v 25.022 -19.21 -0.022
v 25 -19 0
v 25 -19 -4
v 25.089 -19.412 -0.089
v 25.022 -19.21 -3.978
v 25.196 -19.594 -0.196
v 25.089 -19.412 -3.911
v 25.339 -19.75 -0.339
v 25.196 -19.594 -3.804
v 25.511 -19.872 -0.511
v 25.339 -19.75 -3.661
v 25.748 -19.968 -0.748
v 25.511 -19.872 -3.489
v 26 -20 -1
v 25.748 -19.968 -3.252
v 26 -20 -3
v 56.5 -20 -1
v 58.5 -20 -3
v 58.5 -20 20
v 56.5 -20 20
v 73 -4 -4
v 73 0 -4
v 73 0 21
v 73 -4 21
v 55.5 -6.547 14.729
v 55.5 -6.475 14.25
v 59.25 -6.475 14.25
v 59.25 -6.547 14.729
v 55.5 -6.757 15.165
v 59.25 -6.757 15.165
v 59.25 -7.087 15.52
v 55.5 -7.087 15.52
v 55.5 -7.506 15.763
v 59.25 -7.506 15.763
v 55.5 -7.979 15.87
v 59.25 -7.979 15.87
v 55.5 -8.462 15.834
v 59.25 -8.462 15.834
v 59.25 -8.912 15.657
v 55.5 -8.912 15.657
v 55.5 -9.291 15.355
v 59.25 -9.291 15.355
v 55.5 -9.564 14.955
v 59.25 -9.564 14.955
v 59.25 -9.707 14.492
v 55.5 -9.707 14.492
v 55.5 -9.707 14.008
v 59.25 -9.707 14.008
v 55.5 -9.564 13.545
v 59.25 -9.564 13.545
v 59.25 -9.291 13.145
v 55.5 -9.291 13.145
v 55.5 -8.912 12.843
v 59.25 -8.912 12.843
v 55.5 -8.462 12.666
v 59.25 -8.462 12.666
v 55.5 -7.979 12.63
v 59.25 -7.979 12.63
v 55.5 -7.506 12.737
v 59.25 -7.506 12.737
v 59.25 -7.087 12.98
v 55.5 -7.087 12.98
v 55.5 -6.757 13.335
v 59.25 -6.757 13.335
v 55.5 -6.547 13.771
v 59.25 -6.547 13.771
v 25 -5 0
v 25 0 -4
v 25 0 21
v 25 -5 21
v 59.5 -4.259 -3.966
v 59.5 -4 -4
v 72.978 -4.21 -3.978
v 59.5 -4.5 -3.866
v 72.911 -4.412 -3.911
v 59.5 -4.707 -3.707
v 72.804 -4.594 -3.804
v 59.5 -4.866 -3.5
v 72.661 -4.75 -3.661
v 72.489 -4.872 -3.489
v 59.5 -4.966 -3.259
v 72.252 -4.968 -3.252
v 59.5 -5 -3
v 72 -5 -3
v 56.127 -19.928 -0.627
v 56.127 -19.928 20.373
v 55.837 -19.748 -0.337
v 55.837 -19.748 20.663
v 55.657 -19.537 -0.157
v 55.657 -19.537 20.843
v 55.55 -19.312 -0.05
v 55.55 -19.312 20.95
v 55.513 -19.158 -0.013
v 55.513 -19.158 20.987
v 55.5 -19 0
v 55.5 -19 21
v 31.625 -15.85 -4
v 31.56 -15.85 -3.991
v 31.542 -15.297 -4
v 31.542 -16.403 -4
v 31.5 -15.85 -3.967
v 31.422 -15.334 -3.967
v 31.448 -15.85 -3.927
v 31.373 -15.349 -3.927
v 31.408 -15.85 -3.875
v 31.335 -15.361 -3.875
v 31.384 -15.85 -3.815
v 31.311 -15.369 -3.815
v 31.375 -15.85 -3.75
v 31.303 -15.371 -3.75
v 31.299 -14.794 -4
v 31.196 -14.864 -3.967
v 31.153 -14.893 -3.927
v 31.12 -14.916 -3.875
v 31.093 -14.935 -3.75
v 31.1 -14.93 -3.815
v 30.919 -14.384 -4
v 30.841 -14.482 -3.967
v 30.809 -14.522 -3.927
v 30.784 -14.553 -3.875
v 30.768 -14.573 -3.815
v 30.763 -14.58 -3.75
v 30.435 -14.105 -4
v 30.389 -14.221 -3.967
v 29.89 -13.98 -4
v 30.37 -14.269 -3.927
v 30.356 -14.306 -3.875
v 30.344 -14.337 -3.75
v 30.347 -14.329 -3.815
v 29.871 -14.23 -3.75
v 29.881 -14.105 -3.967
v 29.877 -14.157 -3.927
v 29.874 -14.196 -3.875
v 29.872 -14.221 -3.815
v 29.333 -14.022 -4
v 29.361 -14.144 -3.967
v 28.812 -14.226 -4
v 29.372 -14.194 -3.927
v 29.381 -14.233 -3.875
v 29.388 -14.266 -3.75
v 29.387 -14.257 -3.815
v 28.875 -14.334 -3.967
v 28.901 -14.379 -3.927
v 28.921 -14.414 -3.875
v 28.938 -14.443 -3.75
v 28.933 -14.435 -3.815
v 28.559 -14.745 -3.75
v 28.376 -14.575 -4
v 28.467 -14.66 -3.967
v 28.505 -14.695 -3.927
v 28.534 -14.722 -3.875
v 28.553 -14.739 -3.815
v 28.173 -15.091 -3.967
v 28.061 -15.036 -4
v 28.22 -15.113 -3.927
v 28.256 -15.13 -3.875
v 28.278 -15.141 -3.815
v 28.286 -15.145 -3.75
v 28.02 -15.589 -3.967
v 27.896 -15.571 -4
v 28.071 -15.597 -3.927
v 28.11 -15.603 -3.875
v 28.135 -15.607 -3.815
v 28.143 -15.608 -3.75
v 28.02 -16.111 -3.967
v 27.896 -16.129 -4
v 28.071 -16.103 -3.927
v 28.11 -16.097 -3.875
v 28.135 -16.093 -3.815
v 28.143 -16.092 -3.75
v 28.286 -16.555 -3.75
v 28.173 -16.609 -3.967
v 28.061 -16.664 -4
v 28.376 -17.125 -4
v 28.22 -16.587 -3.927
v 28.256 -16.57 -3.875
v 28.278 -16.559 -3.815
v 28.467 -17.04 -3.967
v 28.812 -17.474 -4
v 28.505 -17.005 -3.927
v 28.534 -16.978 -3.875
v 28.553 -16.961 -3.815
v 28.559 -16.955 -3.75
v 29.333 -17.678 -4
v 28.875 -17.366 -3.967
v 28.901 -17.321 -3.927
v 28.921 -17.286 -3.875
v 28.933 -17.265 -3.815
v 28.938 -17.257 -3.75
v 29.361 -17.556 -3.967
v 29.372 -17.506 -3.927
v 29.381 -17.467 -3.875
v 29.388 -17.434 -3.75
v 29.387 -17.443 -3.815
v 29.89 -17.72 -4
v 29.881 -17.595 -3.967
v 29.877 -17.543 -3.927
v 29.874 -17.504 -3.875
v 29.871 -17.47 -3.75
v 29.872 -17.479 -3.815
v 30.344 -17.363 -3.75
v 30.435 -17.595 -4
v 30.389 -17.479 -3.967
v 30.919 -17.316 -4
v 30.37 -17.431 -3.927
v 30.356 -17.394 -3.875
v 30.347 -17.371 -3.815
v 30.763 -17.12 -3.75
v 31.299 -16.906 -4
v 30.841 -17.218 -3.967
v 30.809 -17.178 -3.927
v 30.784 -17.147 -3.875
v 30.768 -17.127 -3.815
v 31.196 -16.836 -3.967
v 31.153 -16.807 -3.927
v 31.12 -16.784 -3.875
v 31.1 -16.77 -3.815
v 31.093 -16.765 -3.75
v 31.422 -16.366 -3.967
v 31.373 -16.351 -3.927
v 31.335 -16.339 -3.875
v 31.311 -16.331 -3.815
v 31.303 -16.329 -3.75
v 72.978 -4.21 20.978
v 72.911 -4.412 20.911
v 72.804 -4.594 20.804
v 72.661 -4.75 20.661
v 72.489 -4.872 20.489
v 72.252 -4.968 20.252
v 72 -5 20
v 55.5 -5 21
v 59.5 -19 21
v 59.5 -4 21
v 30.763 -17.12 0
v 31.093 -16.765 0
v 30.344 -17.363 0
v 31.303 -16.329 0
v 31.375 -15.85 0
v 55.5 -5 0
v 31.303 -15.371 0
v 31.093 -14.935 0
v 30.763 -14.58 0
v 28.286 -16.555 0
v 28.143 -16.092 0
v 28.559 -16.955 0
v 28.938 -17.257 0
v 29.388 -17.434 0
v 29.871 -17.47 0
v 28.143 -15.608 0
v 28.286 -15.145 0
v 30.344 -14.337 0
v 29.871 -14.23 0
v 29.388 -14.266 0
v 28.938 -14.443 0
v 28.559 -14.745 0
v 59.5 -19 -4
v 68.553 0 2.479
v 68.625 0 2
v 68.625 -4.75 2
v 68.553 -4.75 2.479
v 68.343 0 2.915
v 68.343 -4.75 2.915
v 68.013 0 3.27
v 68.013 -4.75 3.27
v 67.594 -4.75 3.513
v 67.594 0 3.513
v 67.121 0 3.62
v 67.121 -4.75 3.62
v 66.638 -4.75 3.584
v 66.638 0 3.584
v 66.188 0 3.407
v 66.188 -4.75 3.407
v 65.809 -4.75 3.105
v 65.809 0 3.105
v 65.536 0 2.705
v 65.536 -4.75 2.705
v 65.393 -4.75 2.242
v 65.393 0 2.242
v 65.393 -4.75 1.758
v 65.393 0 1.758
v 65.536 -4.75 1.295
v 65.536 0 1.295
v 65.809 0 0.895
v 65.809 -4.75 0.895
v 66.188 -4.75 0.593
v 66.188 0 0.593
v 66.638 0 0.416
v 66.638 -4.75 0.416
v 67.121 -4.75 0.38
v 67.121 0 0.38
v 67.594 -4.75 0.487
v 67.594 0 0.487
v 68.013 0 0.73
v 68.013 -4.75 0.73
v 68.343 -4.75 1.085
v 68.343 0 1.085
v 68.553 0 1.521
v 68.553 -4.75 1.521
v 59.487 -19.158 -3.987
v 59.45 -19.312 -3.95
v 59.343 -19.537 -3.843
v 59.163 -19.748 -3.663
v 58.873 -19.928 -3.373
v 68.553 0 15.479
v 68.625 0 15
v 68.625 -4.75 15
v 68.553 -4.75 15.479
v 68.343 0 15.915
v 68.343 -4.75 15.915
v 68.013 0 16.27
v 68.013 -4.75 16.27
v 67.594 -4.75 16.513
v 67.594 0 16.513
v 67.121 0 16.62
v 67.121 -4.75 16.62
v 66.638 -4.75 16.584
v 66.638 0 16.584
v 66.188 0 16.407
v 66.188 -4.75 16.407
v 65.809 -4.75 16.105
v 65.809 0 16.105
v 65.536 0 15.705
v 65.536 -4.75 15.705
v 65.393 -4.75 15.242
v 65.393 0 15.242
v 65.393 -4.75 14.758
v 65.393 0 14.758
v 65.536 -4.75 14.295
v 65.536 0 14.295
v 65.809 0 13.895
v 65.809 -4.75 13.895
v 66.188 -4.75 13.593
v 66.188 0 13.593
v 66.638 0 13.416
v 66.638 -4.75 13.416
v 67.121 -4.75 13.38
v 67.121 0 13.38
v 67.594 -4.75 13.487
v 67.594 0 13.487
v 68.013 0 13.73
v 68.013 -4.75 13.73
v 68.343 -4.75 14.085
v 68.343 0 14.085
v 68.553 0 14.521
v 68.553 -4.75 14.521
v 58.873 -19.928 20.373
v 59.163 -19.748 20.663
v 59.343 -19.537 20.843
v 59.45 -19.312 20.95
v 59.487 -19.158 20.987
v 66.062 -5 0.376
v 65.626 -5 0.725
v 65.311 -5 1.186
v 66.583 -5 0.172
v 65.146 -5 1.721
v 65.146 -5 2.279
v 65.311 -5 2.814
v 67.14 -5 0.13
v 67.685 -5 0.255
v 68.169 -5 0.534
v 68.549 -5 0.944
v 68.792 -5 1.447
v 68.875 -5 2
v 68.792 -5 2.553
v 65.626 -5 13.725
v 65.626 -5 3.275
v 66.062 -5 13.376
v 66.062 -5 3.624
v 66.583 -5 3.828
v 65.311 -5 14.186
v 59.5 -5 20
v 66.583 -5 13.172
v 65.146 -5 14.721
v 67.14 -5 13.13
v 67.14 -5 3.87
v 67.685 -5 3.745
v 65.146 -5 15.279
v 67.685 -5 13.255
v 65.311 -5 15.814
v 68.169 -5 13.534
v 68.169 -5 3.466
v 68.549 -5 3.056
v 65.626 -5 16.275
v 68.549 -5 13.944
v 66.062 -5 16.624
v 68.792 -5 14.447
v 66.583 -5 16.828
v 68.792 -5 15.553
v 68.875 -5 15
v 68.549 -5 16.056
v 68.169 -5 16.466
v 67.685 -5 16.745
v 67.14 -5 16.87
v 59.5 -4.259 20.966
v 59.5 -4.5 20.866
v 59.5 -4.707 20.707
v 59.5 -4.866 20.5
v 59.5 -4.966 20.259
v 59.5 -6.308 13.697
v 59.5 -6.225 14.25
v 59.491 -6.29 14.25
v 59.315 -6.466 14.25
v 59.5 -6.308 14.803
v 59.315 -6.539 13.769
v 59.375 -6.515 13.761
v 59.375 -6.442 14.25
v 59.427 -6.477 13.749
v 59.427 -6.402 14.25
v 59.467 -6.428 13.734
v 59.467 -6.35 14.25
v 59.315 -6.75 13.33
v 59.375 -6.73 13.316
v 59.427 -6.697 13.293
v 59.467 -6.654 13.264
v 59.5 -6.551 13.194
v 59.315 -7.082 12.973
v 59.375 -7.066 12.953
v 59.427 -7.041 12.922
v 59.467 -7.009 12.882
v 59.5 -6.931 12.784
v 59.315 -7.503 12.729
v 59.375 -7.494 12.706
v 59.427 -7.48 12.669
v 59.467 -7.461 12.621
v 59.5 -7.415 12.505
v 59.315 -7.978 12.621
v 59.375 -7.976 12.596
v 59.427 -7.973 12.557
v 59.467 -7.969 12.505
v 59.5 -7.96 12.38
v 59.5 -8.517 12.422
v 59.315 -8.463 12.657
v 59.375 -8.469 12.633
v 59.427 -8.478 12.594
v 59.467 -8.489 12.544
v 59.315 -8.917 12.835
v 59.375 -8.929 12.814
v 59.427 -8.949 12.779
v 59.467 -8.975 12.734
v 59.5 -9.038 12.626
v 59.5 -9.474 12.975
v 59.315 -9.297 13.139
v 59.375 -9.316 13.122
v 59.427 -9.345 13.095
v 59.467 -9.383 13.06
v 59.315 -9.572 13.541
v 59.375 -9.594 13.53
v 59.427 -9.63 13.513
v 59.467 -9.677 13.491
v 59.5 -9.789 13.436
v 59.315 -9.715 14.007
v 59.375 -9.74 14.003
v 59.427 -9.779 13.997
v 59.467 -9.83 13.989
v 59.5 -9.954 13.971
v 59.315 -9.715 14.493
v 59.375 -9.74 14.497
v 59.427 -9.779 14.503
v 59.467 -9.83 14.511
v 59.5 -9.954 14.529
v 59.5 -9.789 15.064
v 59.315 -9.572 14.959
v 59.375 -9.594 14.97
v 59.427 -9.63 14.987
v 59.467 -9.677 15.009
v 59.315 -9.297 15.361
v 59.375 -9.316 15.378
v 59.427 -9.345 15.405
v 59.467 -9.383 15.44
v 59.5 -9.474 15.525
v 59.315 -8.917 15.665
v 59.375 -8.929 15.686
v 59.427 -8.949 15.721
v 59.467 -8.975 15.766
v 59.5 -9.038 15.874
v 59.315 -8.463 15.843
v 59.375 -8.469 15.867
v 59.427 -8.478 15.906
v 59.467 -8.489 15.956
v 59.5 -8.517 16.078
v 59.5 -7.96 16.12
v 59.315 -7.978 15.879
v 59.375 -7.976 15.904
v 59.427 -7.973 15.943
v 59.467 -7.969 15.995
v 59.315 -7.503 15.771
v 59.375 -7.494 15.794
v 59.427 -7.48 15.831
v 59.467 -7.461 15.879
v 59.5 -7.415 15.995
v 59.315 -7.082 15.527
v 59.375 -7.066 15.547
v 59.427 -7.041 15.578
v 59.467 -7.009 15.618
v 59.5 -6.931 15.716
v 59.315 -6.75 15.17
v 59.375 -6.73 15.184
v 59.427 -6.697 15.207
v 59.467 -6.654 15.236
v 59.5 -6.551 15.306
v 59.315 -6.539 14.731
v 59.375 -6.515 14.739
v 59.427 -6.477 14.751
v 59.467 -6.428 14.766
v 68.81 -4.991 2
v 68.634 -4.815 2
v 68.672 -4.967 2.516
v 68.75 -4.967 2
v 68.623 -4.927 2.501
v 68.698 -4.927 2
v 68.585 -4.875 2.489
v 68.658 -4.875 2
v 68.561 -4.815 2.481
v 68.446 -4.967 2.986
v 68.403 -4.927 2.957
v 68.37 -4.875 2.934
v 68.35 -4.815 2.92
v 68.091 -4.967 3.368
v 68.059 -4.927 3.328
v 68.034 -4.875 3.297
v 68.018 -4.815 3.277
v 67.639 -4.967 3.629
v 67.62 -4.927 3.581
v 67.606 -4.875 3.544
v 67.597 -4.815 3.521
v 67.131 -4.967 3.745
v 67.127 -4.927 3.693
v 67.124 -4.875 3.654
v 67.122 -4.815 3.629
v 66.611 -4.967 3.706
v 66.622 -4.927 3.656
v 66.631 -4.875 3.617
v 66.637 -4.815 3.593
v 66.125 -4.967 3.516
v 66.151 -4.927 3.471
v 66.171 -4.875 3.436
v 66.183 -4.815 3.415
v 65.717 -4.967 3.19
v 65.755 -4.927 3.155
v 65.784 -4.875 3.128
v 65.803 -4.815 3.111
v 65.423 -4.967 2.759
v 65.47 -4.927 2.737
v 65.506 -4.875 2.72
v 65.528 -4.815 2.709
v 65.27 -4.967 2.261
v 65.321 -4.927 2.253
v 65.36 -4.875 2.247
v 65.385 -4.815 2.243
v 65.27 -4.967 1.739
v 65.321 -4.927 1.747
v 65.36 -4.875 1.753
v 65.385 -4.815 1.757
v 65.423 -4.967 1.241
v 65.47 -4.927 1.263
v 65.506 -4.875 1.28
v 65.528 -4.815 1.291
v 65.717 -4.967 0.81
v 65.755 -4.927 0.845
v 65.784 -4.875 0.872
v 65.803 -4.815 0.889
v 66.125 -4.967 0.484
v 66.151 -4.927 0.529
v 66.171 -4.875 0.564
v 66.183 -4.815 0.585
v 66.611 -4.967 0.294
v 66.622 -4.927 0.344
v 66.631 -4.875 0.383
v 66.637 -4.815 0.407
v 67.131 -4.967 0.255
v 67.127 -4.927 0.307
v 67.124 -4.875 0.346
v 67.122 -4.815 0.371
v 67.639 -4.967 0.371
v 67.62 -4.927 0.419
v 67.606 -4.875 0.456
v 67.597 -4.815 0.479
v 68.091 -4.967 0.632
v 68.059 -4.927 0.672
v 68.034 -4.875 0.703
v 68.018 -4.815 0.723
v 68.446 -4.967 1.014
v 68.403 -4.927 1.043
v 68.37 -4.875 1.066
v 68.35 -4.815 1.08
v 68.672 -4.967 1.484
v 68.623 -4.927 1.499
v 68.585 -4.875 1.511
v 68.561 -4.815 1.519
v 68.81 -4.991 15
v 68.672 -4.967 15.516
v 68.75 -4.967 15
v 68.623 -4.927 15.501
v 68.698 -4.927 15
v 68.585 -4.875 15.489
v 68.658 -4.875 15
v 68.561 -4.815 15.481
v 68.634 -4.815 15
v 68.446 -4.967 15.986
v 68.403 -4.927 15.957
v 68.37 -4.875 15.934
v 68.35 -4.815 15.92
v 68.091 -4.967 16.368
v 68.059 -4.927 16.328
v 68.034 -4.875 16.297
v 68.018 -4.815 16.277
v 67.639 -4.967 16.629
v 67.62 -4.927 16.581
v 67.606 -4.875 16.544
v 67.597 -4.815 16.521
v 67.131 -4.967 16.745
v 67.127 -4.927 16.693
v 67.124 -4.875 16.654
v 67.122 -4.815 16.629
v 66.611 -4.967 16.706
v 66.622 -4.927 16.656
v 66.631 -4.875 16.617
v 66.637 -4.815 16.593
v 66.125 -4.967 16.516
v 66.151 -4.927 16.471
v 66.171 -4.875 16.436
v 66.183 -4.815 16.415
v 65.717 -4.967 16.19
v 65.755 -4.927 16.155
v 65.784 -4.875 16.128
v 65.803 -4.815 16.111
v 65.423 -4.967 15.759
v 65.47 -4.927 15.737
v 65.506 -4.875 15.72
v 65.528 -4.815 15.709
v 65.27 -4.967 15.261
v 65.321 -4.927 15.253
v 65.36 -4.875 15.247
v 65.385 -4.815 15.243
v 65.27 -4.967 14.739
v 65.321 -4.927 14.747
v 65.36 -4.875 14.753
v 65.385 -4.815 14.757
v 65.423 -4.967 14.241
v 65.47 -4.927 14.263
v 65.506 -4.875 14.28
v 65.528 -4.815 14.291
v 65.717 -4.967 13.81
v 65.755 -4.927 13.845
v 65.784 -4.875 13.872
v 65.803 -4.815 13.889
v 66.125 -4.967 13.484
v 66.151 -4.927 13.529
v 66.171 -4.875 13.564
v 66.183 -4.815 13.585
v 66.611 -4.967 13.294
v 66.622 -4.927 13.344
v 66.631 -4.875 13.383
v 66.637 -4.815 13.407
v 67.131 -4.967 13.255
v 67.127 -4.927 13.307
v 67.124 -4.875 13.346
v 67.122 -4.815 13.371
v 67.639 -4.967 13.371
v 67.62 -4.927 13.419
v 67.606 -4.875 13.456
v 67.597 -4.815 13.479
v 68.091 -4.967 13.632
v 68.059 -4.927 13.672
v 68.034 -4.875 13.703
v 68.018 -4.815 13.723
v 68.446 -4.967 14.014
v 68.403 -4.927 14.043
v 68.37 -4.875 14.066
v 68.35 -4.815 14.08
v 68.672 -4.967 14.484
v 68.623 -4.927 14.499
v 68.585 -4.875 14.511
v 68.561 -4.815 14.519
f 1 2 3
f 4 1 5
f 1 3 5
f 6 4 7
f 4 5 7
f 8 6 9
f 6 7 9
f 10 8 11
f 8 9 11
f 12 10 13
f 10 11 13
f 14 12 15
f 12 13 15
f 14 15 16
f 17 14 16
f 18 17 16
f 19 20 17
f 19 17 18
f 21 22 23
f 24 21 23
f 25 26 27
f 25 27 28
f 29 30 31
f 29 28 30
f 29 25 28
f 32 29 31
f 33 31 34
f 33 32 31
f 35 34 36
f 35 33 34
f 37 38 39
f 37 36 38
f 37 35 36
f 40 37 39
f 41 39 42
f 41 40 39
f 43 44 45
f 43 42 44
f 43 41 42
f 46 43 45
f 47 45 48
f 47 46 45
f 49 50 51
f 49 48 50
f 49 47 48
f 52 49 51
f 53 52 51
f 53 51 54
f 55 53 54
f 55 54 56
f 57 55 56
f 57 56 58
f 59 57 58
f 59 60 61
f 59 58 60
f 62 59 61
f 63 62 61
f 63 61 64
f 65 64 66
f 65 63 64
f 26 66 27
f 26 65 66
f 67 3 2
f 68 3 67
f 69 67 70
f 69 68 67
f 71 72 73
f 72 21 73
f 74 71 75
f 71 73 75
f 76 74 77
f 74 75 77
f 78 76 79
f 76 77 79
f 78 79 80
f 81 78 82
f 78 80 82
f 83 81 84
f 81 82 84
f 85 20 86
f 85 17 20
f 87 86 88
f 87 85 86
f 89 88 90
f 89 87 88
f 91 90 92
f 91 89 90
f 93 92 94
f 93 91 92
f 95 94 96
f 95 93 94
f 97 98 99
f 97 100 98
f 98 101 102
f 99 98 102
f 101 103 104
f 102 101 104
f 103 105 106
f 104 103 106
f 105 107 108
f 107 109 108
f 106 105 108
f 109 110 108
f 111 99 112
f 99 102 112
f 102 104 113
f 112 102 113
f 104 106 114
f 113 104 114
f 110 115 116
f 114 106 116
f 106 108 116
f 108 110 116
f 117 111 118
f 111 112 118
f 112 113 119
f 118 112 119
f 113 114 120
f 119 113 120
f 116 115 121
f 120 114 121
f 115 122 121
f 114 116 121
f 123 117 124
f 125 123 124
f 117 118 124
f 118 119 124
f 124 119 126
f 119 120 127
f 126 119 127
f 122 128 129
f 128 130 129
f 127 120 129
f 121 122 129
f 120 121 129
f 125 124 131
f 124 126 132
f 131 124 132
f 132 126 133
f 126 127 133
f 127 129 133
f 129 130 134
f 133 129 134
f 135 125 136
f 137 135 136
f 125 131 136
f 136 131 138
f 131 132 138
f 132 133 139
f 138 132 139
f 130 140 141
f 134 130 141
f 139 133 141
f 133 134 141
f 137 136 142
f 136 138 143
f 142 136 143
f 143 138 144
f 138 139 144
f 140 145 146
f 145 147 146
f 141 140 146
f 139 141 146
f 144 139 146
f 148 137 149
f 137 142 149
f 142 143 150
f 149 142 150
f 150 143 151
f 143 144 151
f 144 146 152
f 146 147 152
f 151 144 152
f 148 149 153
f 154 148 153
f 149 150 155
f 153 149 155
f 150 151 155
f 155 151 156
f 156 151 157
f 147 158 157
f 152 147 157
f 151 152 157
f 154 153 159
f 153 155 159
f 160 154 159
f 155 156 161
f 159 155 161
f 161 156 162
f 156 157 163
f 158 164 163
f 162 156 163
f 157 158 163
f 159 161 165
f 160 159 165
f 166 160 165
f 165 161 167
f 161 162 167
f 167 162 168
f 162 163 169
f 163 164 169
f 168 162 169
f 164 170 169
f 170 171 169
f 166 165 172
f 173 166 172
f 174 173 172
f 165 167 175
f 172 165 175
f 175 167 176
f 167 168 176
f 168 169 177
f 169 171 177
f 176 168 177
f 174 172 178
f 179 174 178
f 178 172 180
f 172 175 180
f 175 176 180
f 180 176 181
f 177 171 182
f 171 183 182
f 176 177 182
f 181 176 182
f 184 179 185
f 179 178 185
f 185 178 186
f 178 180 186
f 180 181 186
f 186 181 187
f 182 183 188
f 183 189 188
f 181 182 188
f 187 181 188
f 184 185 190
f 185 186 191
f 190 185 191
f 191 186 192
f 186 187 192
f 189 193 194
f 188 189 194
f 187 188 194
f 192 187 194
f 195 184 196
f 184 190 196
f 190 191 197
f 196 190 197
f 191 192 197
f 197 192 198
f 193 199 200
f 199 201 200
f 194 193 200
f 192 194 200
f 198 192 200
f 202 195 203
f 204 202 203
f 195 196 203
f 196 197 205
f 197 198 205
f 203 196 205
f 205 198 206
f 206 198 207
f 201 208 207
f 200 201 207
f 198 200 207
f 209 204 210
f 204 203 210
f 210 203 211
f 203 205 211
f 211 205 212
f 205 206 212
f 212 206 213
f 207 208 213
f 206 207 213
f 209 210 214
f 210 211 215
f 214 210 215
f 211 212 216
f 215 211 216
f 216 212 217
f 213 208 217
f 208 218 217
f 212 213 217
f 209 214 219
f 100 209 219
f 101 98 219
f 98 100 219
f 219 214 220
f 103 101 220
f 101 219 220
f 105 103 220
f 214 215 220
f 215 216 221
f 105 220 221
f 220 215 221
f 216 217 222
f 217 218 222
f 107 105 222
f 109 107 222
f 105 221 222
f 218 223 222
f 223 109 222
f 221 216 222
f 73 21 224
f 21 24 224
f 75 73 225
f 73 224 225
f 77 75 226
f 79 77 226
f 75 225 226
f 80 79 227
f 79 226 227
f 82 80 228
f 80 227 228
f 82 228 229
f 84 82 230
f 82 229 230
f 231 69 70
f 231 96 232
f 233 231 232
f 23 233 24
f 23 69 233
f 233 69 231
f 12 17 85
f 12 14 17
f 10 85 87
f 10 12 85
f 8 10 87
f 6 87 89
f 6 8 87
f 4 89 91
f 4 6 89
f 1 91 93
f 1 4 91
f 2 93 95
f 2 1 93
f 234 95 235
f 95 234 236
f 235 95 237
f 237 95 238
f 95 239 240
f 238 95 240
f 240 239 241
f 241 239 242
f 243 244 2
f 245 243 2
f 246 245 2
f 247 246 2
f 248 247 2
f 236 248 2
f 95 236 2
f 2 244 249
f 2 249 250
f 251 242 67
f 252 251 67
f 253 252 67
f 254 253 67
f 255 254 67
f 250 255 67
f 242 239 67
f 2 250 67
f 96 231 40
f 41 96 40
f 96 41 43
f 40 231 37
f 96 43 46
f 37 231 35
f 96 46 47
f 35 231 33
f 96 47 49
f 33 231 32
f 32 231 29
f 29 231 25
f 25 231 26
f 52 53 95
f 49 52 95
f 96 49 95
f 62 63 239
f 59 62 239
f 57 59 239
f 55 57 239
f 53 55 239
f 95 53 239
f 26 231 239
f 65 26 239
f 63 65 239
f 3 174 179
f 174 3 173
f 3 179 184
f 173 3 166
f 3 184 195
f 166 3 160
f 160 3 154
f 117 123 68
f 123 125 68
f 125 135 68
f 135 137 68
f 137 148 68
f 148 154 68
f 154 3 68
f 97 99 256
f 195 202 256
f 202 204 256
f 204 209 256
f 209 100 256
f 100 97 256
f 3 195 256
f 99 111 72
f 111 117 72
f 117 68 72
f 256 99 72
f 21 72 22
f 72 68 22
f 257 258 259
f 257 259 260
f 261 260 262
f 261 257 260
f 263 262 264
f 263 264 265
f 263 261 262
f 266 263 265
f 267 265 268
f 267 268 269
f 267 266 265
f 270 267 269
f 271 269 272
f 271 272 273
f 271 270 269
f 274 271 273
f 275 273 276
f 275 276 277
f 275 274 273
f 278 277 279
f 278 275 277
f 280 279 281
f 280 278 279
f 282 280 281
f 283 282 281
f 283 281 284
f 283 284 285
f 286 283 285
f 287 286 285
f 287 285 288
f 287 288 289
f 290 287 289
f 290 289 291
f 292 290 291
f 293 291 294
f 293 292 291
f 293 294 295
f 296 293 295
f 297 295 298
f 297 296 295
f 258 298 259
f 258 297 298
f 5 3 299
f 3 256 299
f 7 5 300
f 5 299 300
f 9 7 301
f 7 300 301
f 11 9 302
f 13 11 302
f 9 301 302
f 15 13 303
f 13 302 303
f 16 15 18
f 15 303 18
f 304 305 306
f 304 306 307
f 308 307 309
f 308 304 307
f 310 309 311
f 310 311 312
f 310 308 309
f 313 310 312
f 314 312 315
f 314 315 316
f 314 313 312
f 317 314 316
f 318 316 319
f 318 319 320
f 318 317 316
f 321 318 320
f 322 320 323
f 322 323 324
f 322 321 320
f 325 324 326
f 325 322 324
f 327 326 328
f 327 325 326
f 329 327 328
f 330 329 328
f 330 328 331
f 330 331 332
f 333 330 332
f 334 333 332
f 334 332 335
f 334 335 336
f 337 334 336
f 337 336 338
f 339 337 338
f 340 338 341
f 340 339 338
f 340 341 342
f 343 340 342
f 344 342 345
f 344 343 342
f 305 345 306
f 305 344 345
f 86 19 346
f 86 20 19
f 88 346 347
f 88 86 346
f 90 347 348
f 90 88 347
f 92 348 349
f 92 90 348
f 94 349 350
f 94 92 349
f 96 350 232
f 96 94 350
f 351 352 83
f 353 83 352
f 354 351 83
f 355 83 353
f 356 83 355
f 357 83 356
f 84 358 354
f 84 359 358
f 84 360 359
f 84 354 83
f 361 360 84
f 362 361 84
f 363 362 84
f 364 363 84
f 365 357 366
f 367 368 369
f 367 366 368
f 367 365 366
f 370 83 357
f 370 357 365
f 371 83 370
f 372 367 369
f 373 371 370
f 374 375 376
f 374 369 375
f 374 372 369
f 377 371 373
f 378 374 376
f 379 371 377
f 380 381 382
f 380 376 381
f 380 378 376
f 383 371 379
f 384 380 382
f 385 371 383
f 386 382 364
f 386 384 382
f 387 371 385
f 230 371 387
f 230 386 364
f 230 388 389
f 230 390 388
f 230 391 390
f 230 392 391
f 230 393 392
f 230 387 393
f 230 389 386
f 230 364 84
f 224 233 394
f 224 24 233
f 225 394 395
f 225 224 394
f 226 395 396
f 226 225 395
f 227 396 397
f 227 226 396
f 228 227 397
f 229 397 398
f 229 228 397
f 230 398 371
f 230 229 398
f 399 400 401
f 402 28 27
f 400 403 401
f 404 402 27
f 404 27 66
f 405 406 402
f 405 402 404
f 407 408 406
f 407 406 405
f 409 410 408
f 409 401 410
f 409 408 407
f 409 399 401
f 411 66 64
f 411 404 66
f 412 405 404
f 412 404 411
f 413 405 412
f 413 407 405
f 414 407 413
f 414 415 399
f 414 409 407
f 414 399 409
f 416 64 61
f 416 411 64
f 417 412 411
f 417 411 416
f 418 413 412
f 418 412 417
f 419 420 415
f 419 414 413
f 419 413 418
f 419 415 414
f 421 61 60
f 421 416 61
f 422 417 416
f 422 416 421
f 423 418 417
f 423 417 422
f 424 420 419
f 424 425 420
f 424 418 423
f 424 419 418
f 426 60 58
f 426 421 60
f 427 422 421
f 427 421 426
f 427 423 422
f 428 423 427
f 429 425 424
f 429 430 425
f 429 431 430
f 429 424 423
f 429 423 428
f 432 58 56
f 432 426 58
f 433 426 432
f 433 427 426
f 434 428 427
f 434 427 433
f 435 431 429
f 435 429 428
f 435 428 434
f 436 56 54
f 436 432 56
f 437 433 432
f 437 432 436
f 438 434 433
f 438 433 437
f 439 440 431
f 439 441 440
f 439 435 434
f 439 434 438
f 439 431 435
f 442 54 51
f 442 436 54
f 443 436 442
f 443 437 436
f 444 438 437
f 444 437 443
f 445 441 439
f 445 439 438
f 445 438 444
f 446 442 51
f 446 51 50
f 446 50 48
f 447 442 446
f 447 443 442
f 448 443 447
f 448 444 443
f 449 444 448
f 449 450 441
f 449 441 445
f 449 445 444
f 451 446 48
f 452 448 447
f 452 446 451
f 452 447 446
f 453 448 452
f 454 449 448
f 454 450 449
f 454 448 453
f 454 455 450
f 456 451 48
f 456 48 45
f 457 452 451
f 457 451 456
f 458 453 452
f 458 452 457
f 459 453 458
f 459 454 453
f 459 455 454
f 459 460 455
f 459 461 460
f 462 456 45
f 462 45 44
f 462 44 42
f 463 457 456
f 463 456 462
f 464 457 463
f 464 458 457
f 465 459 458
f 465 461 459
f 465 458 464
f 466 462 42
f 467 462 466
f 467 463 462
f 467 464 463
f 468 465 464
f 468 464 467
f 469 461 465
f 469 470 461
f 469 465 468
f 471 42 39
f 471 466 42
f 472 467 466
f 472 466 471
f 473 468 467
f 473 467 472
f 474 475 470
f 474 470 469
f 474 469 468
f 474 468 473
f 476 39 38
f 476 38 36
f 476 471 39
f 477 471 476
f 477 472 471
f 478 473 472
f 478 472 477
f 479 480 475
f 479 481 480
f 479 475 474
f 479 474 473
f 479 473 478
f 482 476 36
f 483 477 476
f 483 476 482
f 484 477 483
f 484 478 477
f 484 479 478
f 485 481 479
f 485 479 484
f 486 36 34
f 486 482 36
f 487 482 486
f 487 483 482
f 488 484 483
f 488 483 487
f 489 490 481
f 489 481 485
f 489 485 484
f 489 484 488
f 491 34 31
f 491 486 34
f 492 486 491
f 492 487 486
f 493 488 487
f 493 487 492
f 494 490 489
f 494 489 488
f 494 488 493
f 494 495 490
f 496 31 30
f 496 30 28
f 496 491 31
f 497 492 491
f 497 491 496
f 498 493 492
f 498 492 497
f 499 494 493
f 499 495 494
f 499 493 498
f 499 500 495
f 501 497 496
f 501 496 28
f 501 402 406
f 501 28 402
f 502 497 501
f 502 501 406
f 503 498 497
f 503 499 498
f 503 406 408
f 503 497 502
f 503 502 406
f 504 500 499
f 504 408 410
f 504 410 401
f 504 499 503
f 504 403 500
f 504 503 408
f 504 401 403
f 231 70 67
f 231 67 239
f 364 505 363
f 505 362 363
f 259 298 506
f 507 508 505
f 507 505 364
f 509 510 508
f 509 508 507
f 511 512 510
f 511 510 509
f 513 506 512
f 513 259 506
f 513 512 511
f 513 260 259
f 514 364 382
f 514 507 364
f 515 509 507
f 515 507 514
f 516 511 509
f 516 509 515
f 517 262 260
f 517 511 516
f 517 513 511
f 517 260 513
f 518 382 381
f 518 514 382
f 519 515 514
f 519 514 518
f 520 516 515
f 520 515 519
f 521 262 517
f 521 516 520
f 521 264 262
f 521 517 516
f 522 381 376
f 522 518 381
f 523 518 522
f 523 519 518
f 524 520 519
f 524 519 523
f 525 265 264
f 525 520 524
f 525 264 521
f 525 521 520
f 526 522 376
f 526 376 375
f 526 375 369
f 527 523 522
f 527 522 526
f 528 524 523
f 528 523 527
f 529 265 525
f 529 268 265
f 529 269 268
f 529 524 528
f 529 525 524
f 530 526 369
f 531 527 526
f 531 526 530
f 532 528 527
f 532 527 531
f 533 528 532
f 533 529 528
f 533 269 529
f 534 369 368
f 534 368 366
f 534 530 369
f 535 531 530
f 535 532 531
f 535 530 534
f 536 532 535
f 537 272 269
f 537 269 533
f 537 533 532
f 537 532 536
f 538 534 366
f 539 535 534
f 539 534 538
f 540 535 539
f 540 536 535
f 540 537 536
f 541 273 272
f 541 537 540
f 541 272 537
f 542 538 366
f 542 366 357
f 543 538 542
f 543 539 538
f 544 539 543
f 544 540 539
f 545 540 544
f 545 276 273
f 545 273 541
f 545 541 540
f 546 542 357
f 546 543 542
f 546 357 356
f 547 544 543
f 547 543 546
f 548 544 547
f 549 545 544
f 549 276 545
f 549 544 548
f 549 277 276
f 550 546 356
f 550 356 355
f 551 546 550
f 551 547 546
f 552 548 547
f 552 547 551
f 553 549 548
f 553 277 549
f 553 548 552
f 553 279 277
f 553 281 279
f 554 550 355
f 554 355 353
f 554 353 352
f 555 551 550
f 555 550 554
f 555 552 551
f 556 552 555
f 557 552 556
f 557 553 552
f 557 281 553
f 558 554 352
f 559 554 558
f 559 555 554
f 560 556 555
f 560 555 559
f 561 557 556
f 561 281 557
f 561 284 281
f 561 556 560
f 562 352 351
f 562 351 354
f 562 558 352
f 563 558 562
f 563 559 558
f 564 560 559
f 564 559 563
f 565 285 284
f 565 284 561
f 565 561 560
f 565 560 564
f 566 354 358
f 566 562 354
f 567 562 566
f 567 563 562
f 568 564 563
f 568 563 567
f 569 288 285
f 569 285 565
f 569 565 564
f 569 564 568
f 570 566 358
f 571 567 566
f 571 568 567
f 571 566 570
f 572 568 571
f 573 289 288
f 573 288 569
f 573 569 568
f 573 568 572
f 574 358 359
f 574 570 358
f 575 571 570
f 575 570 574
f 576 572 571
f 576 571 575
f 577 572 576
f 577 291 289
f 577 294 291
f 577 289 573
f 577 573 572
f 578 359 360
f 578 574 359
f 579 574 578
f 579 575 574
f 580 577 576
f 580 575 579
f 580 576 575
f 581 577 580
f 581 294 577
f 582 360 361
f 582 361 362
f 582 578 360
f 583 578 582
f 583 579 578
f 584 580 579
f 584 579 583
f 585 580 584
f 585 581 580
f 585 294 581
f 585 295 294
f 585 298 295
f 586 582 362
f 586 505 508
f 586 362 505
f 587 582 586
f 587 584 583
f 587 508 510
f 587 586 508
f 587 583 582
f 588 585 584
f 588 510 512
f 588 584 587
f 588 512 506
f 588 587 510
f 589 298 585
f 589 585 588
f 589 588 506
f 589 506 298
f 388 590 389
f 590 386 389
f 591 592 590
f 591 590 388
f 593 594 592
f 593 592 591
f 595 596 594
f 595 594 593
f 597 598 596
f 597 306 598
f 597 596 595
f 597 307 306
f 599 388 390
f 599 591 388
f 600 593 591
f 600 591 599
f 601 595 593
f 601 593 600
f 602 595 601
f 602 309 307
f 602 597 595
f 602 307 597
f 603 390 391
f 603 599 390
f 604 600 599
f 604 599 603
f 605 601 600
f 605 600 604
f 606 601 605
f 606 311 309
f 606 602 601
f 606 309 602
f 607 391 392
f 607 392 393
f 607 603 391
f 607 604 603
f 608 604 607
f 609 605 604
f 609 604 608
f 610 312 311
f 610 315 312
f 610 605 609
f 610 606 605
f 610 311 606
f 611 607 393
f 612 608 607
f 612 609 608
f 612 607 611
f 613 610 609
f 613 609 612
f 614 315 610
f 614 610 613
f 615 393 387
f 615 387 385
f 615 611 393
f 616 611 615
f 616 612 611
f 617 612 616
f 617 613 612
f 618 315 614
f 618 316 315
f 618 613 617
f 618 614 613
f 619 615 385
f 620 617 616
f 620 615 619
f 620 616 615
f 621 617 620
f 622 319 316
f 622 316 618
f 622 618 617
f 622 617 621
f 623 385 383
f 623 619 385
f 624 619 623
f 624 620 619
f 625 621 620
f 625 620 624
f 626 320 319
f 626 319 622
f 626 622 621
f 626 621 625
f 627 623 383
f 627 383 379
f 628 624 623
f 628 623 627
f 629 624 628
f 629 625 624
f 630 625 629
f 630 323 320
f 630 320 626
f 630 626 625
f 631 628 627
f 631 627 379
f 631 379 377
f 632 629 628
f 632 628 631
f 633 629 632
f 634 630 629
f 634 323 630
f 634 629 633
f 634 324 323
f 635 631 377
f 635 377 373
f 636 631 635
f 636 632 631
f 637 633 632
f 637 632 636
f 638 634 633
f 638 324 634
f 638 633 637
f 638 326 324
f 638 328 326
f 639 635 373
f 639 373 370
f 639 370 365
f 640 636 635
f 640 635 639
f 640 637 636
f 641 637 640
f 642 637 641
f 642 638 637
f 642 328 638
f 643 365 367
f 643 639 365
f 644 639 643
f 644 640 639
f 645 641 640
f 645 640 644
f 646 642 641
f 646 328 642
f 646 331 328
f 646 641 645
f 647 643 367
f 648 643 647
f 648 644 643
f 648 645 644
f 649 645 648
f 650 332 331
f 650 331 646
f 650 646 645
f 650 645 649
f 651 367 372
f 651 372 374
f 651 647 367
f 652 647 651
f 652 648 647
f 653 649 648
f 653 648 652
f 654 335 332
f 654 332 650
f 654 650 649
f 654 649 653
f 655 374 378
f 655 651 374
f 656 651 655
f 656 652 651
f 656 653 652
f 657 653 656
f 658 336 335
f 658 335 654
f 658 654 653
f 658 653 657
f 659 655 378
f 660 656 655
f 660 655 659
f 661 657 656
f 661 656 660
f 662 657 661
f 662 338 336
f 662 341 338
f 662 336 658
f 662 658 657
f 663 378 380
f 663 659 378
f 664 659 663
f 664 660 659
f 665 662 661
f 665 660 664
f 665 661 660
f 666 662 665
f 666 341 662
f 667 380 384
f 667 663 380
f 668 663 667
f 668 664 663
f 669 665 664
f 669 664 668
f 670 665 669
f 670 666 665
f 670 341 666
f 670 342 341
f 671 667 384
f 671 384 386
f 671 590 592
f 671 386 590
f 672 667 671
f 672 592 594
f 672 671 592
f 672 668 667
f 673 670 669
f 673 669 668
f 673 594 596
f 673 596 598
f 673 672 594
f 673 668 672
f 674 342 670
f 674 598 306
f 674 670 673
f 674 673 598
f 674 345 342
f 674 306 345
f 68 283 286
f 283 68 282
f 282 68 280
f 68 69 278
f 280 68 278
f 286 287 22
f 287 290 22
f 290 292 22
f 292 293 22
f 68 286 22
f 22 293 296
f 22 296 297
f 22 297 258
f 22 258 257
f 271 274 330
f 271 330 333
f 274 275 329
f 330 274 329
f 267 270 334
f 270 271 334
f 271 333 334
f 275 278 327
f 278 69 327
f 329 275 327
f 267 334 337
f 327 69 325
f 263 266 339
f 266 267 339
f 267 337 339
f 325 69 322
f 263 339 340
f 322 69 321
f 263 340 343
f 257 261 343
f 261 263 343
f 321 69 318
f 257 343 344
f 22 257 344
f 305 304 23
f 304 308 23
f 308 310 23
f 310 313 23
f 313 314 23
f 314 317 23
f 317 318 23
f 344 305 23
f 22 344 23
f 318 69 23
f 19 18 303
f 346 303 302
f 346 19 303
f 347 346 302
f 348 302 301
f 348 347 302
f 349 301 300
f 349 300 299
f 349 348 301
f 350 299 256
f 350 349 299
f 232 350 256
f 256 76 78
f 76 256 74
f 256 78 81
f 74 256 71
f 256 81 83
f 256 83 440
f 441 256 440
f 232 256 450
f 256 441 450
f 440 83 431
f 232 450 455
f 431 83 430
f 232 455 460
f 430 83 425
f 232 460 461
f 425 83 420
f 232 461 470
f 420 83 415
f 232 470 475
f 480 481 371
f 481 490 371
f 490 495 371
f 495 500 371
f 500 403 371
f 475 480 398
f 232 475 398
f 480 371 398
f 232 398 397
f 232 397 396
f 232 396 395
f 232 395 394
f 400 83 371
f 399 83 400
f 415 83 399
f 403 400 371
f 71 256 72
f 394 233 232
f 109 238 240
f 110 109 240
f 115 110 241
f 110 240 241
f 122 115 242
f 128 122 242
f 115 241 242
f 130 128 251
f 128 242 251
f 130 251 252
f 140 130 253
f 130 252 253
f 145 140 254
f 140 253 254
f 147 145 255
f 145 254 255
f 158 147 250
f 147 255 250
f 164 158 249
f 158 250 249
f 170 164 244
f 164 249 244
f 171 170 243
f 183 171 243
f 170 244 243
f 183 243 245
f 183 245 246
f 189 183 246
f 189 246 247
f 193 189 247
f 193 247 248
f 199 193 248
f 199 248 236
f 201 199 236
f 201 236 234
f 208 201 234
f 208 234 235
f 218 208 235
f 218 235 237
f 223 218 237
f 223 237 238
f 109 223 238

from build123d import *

# Parameters (mm, degrees)
SKETCH007_R      = 1.625
EXTRUDE007_DEPTH = 75
SKETCH006_R      = 1.625
EXTRUDE006_DEPTH = 10
EXTRUDE004_DEPTH = 20
SKETCH005_W      = 48
SKETCH005_H      = 25
SKETCH005_R      = 1.625
EXTRUDE005_DEPTH = 5
FILLET014_R      = 1
FILLET001_R      = 1
FILLET002_R      = 0.25


with BuildPart() as extrude007:
    # Sketch007 → Extrude007 (new body)
    with BuildSketch(Plane.YZ):
        with Locations((-8.1, 14.25)):
            Circle(SKETCH007_R)
    extrude(amount=EXTRUDE007_DEPTH)


with BuildPart() as cuts:
    # Sketch006 → Extrude006 (new body)
    with BuildSketch(Plane.XY):
        with Locations((29.75, -15.85)):
            Circle(SKETCH006_R)
    extrude(amount=-EXTRUDE006_DEPTH)

    # Fusion016: union Extrude007
    add(extrude007.part)


with BuildPart() as extrude004:
    # Sketch004 → Extrude004 (new body)
    with BuildSketch(Plane.XZ):
        Polygon((25, 0), (25, -4), (59.5, -4), (59.5, 21), (55.5, 21), (55.5, 0), align=None)
    extrude(amount=EXTRUDE004_DEPTH)


with BuildPart() as fillet002:
    # Sketch005 → Extrude005 (new body)
    with BuildSketch(Plane.XZ):
        with Locations((49, 8.5)):
            Rectangle(SKETCH005_W, SKETCH005_H)
        with Locations((67, 15)):
            Circle(SKETCH005_R, mode=Mode.SUBTRACT)
        with Locations((67, 2)):
            Circle(SKETCH005_R, mode=Mode.SUBTRACT)
    extrude(amount=EXTRUDE005_DEPTH)

    # Fusion015: union Extrude004
    add(extrude004.part)

    # Cut019: cut cuts
    add(cuts.part, mode=Mode.SUBTRACT)

    # Fillet014
    fillet014_edges = [fillet002.edges().sort_by_distance(p)[0] for p in [
        (57.5, -20, 21),
        (59.5, -20, 8.5),
        (55.5, -20, 10.5),
        (25, -20, -2),
        (42.25, -20, -4),
        (40.25, -20, 0),
    ]]
    fillet(fillet014_edges, radius=FILLET014_R)

    # Fillet001
    fillet001_edges = [fillet002.edges().sort_by_distance(p)[0] for p in [
        (66.25, -5, 21),
        (66.25, -5, -4),
        (73, -5, 8.5),
    ]]
    fillet(fillet001_edges, radius=FILLET001_R)

    # Fillet002
    fillet002_edges = [fillet002.edges().sort_by_distance(p)[0] for p in [
        (59.5, -9.725, 14.25),
        (28.125, -15.85, -4),
        (65.375, -5, 2),
        (65.375, -5, 15),
    ]]
    fillet(fillet002_edges, radius=FILLET002_R)


solid = fillet002.part
